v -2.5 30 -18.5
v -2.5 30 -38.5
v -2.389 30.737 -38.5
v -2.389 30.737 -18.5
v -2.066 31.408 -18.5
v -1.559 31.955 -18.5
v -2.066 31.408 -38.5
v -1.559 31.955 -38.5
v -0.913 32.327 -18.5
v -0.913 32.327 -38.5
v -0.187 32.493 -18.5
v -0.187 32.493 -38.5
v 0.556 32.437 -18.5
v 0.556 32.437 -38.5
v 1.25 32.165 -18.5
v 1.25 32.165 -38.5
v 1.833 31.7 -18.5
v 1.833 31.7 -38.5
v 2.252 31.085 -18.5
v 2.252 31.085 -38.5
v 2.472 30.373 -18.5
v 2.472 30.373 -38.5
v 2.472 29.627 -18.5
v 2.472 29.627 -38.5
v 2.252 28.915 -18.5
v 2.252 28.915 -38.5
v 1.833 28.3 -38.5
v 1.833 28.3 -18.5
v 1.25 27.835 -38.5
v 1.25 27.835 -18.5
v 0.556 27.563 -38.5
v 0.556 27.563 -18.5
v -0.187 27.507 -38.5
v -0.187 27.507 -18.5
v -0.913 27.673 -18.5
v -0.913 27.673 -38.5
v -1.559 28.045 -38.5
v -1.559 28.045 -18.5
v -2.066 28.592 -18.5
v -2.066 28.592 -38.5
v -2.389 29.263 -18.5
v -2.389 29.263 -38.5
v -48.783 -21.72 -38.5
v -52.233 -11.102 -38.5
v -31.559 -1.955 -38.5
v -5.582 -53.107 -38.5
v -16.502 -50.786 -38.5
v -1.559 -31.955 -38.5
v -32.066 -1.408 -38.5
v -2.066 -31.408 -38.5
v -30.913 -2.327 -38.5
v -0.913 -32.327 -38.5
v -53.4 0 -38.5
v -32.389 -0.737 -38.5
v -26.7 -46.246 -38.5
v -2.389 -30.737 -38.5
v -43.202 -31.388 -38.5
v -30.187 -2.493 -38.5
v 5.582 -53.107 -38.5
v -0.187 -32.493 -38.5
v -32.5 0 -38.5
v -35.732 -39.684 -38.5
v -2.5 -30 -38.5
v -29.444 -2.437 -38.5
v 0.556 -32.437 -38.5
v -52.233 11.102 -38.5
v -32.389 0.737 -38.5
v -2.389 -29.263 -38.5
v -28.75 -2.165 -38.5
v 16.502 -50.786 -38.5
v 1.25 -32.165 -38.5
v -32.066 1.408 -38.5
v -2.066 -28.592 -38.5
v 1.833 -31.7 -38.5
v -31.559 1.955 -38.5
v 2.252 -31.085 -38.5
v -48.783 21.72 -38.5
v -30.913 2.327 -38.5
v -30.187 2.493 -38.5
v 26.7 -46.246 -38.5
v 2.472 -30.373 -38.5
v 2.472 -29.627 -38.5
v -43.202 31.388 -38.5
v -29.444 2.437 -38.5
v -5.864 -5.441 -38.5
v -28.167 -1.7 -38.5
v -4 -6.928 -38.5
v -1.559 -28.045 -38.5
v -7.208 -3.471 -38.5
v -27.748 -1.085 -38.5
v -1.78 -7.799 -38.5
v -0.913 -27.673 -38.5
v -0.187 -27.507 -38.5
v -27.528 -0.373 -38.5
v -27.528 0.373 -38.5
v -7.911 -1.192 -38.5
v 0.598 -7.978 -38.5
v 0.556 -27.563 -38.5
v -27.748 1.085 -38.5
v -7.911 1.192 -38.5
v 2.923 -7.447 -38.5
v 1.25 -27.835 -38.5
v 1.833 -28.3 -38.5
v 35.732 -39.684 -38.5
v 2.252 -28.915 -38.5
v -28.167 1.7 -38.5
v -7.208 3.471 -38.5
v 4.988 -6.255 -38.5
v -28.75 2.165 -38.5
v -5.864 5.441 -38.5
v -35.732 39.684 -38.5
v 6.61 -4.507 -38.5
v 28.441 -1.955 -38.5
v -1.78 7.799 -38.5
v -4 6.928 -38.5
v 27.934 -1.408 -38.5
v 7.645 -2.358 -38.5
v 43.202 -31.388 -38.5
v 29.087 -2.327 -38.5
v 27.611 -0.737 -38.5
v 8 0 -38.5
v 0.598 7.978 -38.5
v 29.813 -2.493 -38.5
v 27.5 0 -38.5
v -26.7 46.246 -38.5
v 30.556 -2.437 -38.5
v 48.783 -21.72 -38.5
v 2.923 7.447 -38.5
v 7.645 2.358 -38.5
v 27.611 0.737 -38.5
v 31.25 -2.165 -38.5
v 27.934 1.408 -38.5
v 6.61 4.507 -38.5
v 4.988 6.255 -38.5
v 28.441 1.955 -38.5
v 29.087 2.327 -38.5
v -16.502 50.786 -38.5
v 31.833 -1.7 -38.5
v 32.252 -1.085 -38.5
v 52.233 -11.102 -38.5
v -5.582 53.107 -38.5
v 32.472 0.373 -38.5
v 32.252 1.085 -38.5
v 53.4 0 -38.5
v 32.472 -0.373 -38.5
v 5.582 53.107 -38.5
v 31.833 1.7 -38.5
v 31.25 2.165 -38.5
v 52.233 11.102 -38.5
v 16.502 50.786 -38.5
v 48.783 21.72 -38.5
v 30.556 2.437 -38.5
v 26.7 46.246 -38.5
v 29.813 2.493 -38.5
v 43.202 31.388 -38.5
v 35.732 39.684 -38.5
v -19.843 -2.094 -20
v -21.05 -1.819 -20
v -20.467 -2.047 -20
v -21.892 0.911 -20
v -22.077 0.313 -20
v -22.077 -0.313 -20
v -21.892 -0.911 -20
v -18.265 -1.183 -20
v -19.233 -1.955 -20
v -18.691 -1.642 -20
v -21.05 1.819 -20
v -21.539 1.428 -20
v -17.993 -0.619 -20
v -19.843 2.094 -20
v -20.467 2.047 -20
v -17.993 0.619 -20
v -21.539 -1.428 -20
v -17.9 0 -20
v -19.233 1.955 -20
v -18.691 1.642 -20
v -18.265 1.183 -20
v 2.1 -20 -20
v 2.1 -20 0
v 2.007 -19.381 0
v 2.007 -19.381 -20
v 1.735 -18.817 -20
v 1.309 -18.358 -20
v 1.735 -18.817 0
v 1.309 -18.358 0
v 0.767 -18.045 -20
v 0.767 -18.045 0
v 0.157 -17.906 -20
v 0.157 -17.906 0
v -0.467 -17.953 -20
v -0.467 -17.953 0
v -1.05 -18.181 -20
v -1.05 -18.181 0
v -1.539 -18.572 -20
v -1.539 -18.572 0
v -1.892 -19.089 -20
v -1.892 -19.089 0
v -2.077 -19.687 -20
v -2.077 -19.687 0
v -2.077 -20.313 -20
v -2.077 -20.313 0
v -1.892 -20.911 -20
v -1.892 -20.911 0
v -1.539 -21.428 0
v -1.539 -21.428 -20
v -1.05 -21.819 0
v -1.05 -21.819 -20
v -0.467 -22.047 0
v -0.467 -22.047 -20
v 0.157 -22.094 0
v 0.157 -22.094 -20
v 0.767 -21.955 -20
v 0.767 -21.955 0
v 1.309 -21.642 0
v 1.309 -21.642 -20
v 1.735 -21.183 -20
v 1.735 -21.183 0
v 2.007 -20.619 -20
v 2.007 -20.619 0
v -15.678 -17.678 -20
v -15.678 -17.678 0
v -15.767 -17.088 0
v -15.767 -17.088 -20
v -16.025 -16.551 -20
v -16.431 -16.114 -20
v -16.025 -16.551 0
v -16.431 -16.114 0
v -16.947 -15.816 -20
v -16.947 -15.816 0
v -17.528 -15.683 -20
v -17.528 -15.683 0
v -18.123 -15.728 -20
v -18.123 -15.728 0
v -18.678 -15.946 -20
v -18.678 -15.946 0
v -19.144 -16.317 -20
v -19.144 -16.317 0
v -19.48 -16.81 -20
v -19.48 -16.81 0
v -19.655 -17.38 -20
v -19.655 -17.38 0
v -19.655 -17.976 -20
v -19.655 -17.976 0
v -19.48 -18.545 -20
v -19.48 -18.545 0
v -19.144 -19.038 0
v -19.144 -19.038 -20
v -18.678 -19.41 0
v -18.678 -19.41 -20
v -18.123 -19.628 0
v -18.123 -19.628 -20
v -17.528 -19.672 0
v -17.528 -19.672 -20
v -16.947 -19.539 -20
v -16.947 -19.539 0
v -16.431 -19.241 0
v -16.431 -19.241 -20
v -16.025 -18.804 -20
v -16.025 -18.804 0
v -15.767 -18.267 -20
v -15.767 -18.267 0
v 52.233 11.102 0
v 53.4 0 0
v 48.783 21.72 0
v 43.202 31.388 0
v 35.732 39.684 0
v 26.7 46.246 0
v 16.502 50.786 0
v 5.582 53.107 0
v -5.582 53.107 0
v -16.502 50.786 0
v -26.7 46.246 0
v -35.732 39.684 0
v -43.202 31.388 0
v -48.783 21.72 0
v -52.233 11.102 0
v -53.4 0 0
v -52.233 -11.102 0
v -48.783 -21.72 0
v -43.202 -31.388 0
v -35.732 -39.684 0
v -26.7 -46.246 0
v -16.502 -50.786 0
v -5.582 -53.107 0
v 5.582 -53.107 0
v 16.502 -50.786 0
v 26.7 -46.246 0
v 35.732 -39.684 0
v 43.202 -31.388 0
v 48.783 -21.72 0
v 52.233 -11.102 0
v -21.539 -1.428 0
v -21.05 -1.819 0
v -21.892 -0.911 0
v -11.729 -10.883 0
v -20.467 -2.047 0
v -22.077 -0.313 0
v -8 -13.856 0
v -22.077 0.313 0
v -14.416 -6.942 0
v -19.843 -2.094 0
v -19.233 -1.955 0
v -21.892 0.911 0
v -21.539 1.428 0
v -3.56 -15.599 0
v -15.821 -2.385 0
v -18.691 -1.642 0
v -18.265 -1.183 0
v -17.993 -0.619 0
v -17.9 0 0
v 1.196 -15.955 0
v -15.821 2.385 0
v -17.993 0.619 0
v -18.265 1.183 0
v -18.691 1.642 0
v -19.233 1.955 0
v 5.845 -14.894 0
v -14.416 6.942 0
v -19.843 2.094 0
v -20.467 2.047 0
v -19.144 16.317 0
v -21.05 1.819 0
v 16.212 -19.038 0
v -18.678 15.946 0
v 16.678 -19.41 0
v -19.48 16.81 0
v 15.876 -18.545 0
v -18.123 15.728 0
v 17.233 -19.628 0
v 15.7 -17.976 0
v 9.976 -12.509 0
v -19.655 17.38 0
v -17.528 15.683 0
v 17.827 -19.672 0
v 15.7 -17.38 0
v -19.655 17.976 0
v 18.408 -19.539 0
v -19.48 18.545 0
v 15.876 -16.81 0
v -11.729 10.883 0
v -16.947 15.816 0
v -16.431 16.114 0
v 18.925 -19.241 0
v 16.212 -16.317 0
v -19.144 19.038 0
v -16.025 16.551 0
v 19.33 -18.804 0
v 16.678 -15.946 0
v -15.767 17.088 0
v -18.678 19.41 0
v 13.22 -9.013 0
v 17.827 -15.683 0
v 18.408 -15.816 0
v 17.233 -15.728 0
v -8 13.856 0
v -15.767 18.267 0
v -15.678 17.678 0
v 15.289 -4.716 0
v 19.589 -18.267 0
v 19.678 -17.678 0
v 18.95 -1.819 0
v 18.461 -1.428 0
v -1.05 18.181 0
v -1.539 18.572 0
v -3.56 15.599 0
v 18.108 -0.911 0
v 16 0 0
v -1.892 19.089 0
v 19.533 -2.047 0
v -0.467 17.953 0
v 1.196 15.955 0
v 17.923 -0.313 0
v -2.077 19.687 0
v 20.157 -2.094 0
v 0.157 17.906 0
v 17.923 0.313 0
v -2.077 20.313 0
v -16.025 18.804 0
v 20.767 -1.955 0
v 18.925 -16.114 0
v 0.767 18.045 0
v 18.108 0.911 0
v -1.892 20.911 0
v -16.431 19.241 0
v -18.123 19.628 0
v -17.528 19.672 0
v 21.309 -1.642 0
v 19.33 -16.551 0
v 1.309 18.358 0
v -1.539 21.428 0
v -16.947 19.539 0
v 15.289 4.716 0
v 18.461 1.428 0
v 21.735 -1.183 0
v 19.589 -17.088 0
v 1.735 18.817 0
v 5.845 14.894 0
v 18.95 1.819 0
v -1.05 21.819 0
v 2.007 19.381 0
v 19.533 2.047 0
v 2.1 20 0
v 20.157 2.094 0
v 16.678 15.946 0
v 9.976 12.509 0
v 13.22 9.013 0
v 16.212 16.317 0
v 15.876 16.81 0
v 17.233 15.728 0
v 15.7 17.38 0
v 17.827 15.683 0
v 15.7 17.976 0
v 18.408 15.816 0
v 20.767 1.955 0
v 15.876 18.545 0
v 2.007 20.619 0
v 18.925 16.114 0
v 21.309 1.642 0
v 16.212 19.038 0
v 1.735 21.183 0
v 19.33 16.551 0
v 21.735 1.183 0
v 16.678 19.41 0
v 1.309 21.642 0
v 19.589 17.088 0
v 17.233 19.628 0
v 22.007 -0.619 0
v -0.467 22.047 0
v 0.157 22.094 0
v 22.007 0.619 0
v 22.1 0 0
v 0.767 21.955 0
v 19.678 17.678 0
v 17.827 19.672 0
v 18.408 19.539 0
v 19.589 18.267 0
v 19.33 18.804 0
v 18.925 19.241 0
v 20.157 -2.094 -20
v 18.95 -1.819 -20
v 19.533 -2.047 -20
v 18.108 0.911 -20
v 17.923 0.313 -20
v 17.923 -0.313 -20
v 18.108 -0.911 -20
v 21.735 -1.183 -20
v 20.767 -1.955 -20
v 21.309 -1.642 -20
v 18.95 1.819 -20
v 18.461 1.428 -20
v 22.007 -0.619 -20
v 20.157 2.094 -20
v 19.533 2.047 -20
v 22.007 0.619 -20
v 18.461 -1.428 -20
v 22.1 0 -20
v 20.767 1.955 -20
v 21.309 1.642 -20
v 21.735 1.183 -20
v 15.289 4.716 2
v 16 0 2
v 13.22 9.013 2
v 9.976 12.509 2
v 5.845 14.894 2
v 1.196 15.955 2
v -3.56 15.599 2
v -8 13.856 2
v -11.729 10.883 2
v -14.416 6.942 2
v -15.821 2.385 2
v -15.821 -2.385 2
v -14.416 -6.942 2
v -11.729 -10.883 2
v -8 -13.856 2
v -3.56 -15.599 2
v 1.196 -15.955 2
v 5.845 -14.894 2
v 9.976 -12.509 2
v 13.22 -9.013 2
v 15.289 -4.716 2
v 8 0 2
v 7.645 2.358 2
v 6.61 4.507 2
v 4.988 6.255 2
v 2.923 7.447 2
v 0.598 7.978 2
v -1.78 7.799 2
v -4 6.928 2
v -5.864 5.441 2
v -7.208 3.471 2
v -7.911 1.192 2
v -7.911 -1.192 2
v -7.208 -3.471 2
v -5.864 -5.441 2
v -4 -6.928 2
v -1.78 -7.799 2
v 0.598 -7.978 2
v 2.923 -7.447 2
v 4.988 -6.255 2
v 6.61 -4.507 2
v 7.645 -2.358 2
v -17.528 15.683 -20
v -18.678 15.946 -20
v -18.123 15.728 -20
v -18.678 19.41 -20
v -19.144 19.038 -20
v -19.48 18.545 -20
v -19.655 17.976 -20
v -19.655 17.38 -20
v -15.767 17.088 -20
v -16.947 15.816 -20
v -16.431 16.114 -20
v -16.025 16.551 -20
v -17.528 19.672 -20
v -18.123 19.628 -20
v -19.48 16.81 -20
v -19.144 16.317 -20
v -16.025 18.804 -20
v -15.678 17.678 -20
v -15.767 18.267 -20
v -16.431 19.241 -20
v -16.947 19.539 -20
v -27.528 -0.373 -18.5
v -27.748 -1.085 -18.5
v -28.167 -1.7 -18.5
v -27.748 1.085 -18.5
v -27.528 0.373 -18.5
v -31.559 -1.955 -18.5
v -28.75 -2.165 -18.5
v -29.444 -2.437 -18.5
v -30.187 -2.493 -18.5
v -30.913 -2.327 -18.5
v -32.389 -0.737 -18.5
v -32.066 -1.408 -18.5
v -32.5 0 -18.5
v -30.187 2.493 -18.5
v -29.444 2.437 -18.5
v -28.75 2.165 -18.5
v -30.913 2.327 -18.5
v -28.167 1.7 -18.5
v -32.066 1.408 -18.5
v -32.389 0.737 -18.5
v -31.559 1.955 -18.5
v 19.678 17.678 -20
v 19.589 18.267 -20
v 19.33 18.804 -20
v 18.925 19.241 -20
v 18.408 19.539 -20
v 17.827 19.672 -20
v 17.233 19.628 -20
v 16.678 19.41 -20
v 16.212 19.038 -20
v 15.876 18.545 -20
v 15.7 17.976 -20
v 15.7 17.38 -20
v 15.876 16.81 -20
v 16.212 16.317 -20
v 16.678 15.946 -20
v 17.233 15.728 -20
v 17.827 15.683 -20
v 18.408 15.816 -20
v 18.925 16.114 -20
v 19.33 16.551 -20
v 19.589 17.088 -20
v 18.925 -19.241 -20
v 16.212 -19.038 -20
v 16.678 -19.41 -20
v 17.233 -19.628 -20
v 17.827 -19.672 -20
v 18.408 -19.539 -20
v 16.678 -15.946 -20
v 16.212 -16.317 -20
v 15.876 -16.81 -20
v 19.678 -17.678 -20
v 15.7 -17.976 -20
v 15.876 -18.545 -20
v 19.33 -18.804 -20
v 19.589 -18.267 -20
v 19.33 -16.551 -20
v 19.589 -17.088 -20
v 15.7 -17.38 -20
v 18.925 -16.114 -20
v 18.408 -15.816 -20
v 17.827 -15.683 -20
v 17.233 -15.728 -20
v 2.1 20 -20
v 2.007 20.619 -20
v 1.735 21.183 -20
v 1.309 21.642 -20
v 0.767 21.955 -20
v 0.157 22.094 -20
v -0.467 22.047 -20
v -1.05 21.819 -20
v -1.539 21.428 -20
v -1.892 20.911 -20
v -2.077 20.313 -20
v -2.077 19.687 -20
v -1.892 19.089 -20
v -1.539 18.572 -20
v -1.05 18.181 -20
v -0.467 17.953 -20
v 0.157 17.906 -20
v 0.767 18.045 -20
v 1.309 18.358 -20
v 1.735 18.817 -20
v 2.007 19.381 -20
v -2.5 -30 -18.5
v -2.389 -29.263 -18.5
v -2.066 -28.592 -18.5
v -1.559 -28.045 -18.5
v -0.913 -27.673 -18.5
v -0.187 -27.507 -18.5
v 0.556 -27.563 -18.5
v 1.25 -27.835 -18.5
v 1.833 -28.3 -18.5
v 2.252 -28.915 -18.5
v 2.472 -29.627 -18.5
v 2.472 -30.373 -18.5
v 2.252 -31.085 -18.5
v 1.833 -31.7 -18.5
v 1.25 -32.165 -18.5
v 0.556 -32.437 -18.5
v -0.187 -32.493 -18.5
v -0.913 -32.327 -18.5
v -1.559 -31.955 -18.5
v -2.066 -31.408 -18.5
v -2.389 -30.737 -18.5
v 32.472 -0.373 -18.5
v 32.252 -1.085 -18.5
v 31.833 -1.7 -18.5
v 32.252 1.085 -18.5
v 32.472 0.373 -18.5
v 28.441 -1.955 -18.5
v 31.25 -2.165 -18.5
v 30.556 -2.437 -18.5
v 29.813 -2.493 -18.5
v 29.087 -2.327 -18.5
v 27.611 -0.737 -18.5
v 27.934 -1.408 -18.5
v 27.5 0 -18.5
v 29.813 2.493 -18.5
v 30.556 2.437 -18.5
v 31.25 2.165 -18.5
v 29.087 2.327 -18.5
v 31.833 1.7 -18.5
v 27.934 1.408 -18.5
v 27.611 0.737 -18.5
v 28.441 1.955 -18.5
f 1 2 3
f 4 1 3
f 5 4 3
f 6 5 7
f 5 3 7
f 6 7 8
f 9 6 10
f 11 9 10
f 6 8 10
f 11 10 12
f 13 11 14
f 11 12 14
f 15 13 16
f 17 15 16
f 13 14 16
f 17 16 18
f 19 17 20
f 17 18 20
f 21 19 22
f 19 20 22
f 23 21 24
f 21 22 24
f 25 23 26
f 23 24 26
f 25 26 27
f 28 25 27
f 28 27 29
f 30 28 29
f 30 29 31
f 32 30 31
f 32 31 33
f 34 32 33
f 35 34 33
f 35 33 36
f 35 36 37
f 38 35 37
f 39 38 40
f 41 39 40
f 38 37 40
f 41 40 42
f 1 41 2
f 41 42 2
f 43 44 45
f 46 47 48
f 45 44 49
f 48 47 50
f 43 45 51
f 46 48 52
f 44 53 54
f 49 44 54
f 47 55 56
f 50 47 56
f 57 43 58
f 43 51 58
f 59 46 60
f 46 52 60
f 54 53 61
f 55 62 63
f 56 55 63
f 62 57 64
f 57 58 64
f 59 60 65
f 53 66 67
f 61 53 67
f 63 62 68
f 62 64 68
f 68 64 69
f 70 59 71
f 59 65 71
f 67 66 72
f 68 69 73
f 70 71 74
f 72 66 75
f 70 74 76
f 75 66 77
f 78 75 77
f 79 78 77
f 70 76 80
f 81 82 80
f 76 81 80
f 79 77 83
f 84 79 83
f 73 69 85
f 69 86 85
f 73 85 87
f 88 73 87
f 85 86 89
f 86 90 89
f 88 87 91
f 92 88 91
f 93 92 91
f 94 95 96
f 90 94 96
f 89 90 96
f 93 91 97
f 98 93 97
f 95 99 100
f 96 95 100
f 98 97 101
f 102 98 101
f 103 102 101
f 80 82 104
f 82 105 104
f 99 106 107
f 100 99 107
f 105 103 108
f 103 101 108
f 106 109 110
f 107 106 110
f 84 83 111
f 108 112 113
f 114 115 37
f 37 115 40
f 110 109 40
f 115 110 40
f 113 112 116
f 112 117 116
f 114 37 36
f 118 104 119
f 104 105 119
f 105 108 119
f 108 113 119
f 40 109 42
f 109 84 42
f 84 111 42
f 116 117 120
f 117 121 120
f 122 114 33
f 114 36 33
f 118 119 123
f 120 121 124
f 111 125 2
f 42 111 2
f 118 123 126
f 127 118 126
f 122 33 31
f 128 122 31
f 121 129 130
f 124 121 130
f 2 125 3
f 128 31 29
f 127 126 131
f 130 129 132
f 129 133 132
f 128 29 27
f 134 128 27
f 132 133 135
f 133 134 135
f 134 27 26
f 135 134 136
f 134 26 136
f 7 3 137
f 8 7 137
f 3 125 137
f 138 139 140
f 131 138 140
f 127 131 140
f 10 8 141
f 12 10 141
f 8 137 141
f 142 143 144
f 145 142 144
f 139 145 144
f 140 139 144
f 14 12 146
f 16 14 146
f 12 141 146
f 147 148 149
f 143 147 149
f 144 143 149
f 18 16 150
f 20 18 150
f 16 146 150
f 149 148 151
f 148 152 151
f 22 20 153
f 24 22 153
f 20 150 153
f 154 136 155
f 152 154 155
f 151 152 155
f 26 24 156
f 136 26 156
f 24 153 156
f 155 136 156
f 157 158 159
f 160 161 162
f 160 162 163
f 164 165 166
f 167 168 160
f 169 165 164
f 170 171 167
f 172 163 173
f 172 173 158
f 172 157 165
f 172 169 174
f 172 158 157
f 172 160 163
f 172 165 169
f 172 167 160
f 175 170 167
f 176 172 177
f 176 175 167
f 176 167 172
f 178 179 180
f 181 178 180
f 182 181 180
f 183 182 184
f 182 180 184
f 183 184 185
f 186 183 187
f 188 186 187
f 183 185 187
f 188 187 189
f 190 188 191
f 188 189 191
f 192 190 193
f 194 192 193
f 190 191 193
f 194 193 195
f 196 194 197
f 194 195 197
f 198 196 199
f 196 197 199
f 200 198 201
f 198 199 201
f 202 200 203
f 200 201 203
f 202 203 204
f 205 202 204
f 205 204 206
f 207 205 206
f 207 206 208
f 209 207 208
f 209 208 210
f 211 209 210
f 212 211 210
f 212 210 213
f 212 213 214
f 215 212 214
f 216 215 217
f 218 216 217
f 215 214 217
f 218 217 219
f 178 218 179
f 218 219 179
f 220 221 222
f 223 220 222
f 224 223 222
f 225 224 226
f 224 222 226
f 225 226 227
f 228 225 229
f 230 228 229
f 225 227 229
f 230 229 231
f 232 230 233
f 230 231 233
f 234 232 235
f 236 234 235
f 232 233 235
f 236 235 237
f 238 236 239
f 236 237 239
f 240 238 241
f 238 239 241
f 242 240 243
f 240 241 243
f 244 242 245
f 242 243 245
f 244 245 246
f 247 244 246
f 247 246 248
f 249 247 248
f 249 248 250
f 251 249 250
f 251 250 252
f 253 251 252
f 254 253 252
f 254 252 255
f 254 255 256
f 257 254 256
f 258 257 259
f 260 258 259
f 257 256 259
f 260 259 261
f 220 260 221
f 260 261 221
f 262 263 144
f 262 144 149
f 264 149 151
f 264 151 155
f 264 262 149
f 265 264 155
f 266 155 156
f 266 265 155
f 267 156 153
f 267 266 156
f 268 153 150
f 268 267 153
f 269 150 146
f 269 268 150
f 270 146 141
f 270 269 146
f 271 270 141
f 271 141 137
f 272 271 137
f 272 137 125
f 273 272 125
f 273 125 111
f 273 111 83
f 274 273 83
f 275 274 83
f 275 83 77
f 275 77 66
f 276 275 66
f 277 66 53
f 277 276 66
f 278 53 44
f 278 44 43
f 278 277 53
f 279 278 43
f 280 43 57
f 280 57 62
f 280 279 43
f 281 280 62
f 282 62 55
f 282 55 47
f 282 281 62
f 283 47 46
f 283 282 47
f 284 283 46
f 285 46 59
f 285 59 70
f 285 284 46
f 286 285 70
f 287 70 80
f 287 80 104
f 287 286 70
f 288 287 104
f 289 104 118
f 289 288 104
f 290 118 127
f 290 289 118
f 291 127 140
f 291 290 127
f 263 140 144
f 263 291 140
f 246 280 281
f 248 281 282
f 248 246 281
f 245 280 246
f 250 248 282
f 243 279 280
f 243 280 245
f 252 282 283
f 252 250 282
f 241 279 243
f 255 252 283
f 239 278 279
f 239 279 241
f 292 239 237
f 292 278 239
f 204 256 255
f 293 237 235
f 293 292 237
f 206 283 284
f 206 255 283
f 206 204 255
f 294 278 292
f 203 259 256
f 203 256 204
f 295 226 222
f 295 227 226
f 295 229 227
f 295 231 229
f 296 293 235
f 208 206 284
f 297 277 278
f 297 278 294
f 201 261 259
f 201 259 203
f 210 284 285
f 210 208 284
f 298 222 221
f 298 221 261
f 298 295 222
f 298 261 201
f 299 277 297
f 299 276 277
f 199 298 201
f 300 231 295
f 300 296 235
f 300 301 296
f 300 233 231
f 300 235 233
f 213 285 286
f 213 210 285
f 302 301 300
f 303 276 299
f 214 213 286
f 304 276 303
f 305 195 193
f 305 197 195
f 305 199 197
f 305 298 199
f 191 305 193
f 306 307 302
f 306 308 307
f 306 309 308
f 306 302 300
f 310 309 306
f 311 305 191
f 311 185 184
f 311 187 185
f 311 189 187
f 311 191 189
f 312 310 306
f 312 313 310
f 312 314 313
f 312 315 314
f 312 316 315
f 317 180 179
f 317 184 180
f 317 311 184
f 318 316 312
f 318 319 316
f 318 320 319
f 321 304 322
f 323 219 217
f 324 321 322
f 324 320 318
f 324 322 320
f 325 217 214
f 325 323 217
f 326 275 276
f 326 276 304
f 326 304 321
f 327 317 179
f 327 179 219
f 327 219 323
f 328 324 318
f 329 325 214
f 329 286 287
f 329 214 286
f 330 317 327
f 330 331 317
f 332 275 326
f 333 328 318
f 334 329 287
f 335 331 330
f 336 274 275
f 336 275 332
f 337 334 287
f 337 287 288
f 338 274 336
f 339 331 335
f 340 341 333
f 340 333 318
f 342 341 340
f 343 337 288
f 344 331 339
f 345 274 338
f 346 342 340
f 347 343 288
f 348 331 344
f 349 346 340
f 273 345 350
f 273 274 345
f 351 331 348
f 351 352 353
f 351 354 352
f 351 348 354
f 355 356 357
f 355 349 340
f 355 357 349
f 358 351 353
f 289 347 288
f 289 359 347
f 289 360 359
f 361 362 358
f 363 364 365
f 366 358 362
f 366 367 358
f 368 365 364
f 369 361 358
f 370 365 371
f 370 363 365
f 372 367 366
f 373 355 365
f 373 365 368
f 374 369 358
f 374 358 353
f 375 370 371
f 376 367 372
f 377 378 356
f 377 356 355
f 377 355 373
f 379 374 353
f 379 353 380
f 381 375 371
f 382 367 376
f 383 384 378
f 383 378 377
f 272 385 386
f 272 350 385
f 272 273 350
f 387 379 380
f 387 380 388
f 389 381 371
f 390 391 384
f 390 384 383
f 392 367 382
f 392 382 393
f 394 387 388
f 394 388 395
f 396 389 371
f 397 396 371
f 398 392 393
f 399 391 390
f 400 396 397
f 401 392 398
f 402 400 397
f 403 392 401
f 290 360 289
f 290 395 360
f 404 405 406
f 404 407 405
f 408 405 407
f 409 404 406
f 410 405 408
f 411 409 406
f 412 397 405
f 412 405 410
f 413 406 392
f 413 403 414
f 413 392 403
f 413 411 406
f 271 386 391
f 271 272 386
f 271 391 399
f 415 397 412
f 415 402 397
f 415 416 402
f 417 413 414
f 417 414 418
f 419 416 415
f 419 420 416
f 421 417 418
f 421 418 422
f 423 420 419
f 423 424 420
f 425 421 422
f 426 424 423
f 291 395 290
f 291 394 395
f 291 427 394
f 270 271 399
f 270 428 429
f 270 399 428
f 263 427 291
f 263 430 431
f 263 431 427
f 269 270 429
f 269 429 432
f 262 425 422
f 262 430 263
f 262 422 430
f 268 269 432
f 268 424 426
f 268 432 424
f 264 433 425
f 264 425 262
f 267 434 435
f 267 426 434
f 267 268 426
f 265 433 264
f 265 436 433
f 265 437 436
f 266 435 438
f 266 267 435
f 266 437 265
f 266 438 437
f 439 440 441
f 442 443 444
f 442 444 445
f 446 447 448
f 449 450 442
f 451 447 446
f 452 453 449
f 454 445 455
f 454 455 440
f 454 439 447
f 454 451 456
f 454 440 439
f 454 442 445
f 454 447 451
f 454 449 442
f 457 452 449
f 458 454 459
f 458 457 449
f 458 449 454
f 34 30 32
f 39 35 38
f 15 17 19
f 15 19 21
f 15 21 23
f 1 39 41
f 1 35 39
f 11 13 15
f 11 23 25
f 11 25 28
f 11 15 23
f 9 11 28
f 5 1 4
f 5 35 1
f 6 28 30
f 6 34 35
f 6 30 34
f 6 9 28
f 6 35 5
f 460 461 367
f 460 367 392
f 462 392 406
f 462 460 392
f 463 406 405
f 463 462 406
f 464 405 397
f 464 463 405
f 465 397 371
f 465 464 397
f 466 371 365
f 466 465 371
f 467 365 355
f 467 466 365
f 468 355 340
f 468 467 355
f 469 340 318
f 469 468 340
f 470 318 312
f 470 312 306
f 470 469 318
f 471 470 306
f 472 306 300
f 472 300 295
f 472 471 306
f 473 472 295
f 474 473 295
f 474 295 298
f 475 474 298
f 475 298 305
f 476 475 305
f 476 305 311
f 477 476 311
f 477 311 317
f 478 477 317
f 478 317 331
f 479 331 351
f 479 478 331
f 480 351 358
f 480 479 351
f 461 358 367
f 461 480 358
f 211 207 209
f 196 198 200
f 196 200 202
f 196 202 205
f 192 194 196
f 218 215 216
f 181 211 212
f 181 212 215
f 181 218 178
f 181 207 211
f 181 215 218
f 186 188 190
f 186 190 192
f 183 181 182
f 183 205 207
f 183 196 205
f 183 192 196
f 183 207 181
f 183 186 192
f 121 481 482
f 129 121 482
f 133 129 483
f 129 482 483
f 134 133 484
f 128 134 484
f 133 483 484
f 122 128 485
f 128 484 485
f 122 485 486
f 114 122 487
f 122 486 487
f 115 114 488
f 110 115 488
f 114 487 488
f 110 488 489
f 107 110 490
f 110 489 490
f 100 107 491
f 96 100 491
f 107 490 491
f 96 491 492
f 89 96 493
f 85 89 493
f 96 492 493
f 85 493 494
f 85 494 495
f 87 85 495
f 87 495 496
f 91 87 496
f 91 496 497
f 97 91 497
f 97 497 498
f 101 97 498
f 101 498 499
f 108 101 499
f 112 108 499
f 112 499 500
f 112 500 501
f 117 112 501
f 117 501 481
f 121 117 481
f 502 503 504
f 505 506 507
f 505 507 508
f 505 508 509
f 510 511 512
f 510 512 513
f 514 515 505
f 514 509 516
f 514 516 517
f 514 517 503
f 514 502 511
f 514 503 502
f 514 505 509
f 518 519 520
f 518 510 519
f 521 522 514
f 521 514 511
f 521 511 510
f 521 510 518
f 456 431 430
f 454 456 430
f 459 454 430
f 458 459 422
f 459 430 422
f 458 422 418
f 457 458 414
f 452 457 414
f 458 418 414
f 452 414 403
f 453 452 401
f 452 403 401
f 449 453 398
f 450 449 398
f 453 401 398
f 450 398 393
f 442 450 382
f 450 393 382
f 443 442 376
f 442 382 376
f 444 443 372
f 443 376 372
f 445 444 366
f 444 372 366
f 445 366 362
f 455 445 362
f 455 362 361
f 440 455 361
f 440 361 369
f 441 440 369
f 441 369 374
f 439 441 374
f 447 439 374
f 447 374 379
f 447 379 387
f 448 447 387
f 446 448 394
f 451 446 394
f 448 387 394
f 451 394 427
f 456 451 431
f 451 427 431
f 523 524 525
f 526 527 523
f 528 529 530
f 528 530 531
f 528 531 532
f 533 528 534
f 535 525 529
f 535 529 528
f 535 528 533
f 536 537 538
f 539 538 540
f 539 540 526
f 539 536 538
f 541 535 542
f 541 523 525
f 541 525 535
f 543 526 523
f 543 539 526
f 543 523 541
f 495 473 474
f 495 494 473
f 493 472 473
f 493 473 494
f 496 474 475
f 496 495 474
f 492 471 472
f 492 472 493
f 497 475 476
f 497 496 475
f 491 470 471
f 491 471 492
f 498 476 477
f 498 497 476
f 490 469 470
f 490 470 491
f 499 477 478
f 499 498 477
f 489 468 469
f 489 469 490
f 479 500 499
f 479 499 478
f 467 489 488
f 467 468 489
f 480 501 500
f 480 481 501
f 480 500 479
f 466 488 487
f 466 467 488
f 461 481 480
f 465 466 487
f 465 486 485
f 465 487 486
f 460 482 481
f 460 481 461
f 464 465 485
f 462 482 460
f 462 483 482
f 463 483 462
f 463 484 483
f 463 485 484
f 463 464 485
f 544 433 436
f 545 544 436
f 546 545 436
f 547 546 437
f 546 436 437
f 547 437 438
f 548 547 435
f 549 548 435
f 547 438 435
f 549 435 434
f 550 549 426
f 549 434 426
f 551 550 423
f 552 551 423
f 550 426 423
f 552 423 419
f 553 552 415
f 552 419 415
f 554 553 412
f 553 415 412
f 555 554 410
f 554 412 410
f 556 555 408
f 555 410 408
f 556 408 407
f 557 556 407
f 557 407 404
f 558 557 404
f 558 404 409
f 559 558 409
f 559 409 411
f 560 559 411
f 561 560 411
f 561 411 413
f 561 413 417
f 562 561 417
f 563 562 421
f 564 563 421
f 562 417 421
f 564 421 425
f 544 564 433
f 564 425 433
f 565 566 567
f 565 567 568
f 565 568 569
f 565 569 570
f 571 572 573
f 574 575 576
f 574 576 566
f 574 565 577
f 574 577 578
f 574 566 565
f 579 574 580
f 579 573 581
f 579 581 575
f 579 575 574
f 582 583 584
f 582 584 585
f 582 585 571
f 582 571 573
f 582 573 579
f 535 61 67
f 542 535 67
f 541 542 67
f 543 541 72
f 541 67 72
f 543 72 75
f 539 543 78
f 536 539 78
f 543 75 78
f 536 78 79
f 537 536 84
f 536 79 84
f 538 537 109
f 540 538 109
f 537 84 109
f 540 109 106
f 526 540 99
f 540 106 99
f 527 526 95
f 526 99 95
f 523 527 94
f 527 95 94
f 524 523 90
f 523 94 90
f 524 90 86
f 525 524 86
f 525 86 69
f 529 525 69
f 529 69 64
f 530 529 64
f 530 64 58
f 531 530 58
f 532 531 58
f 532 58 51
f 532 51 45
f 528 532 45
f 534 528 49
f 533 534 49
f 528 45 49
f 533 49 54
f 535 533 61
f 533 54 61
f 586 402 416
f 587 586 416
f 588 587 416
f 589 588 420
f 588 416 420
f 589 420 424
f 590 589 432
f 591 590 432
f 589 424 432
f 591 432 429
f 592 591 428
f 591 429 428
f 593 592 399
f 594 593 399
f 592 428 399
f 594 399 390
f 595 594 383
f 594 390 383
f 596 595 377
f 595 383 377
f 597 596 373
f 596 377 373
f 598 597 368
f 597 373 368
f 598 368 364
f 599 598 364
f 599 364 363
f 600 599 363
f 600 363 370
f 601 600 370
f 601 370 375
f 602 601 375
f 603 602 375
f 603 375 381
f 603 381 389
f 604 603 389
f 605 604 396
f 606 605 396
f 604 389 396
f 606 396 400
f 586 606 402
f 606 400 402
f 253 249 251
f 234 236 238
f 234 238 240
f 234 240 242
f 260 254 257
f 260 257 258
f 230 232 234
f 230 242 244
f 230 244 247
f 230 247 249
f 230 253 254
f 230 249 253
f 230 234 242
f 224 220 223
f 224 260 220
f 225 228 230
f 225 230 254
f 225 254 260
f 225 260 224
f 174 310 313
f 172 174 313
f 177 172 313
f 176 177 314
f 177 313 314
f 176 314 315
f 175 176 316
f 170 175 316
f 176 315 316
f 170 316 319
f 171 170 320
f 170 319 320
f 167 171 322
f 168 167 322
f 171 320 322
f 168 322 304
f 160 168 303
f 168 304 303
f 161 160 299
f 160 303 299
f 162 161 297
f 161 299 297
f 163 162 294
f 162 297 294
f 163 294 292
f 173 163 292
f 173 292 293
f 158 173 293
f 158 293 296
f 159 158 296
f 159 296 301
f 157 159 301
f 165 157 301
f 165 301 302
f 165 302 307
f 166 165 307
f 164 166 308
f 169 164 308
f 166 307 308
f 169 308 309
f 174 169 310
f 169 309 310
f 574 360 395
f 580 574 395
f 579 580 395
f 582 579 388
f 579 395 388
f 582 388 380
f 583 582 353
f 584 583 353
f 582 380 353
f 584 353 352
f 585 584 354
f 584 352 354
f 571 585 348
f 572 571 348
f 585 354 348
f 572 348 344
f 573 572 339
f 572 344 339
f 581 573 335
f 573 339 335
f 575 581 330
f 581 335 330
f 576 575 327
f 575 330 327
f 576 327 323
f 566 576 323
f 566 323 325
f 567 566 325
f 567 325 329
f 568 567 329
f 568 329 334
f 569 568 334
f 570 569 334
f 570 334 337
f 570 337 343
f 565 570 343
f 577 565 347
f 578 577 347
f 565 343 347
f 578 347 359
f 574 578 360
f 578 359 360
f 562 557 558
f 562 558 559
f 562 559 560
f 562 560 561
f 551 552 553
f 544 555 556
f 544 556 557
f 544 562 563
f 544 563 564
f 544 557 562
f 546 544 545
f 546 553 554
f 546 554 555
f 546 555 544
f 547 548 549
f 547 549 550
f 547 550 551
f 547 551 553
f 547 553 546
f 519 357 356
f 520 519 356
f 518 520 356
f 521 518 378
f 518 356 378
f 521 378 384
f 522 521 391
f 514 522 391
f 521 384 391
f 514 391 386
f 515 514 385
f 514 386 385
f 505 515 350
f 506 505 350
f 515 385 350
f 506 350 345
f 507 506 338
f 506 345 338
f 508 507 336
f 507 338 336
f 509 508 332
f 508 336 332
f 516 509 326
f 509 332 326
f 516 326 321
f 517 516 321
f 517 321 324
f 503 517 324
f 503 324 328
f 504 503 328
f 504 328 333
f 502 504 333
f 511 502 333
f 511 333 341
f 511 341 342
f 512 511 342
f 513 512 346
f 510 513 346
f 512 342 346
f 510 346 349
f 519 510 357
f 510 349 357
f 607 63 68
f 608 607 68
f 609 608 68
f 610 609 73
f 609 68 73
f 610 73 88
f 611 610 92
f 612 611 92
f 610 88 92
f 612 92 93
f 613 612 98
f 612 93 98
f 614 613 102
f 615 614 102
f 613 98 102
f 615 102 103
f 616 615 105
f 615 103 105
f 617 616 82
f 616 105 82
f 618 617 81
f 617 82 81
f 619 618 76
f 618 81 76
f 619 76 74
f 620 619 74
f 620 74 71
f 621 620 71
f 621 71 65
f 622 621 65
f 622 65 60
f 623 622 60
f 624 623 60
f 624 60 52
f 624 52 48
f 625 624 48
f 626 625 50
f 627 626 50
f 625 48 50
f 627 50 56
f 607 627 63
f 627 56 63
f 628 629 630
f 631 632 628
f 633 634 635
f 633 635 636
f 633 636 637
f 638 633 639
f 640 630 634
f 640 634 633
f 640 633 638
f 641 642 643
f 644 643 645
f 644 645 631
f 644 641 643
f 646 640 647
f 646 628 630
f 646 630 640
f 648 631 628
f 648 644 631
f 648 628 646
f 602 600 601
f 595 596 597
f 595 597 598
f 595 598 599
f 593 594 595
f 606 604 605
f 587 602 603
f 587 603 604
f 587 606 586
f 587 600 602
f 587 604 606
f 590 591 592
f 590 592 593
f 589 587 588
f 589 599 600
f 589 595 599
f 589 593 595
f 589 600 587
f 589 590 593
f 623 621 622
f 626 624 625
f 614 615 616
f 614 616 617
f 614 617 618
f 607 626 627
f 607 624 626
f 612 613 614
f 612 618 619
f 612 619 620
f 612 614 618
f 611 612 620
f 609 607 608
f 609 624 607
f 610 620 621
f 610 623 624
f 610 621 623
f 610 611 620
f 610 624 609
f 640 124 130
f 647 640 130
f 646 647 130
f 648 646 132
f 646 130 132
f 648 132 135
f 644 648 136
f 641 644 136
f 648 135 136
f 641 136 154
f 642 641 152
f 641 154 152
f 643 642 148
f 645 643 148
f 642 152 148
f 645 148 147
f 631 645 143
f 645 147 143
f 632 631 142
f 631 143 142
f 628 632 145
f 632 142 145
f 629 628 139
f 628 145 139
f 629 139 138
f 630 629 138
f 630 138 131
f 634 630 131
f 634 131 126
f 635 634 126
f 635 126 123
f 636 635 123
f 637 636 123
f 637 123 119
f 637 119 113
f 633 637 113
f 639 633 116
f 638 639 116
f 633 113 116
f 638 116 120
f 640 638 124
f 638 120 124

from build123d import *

# Parameters (mm, degrees)
SKETCH3_R           = 53.4
BOSS_EXTRUDE1_DEPTH = 38.5
SKETCH4_R           = 8
CUT_EXTRUDE1_DEPTH  = 85.766561804
SKETCH5_R           = 2
CUT_EXTRUDE2_DEPTH  = 20
BOSS_EXTRUDE3_START = 2
SKETCH6_R           = 16
SKETCH6_R_2         = 8
BOSS_EXTRUDE3_DEPTH = 2
SKETCH7_R           = 2.1
CUT_EXTRUDE3_DEPTH  = 20
SKETCH8_R           = 2.5
CUT_EXTRUDE4_DEPTH  = 20


with BuildPart() as part:
    # Sketch3 → Boss-Extrude1 (new body)
    with BuildSketch(Plane.XY):
        Circle(SKETCH3_R)
    extrude(amount=-BOSS_EXTRUDE1_DEPTH)

    # Sketch4 → Cut-Extrude1 (cut, through all)
    with BuildSketch(Plane.XY):
        Circle(SKETCH4_R)
    extrude(amount=-CUT_EXTRUDE1_DEPTH, mode=Mode.SUBTRACT)

    # Sketch5 → Cut-Extrude2 (cut)
    with BuildSketch(Plane.XY):
        with Locations((-17.67766953, 17.67766953)):
            Circle(SKETCH5_R)
        with Locations((17.67766953, 17.67766953)):
            Circle(SKETCH5_R)
        with Locations((-17.67766953, -17.67766953)):
            Circle(SKETCH5_R)
        with Locations((17.67766953, -17.67766953)):
            Circle(SKETCH5_R)
    extrude(amount=-CUT_EXTRUDE2_DEPTH, mode=Mode.SUBTRACT)

    # Sketch6 → Boss-Extrude3 (add)
    with BuildSketch(Plane.XY.offset(BOSS_EXTRUDE3_START)):
        Circle(SKETCH6_R)
        Circle(SKETCH6_R_2, mode=Mode.SUBTRACT)
    extrude(amount=-BOSS_EXTRUDE3_DEPTH)

    # Sketch7 → Cut-Extrude3 (cut)
    with BuildSketch(Plane.XY):
        with Locations((0, 20)):
            Circle(SKETCH7_R)
        with Locations((20, 0)):
            Circle(SKETCH7_R)
        with Locations((-20, 0)):
            Circle(SKETCH7_R)
        with Locations((0, -20)):
            Circle(SKETCH7_R)
    extrude(amount=-CUT_EXTRUDE3_DEPTH, mode=Mode.SUBTRACT)

    # Sketch8 → Cut-Extrude4 (cut)
    with BuildSketch(Plane(origin=(0, 0, -38.5), x_dir=(-1, 0, 0), z_dir=(0, 0, -1))):
        with Locations((0, 30)):
            Circle(SKETCH8_R)
        with Locations((30, 0)):
            Circle(SKETCH8_R)
        with Locations((0, -30)):
            Circle(SKETCH8_R)
        with Locations((-30, 0)):
            Circle(SKETCH8_R)
    extrude(amount=-CUT_EXTRUDE4_DEPTH, mode=Mode.SUBTRACT)


solid = part.part
